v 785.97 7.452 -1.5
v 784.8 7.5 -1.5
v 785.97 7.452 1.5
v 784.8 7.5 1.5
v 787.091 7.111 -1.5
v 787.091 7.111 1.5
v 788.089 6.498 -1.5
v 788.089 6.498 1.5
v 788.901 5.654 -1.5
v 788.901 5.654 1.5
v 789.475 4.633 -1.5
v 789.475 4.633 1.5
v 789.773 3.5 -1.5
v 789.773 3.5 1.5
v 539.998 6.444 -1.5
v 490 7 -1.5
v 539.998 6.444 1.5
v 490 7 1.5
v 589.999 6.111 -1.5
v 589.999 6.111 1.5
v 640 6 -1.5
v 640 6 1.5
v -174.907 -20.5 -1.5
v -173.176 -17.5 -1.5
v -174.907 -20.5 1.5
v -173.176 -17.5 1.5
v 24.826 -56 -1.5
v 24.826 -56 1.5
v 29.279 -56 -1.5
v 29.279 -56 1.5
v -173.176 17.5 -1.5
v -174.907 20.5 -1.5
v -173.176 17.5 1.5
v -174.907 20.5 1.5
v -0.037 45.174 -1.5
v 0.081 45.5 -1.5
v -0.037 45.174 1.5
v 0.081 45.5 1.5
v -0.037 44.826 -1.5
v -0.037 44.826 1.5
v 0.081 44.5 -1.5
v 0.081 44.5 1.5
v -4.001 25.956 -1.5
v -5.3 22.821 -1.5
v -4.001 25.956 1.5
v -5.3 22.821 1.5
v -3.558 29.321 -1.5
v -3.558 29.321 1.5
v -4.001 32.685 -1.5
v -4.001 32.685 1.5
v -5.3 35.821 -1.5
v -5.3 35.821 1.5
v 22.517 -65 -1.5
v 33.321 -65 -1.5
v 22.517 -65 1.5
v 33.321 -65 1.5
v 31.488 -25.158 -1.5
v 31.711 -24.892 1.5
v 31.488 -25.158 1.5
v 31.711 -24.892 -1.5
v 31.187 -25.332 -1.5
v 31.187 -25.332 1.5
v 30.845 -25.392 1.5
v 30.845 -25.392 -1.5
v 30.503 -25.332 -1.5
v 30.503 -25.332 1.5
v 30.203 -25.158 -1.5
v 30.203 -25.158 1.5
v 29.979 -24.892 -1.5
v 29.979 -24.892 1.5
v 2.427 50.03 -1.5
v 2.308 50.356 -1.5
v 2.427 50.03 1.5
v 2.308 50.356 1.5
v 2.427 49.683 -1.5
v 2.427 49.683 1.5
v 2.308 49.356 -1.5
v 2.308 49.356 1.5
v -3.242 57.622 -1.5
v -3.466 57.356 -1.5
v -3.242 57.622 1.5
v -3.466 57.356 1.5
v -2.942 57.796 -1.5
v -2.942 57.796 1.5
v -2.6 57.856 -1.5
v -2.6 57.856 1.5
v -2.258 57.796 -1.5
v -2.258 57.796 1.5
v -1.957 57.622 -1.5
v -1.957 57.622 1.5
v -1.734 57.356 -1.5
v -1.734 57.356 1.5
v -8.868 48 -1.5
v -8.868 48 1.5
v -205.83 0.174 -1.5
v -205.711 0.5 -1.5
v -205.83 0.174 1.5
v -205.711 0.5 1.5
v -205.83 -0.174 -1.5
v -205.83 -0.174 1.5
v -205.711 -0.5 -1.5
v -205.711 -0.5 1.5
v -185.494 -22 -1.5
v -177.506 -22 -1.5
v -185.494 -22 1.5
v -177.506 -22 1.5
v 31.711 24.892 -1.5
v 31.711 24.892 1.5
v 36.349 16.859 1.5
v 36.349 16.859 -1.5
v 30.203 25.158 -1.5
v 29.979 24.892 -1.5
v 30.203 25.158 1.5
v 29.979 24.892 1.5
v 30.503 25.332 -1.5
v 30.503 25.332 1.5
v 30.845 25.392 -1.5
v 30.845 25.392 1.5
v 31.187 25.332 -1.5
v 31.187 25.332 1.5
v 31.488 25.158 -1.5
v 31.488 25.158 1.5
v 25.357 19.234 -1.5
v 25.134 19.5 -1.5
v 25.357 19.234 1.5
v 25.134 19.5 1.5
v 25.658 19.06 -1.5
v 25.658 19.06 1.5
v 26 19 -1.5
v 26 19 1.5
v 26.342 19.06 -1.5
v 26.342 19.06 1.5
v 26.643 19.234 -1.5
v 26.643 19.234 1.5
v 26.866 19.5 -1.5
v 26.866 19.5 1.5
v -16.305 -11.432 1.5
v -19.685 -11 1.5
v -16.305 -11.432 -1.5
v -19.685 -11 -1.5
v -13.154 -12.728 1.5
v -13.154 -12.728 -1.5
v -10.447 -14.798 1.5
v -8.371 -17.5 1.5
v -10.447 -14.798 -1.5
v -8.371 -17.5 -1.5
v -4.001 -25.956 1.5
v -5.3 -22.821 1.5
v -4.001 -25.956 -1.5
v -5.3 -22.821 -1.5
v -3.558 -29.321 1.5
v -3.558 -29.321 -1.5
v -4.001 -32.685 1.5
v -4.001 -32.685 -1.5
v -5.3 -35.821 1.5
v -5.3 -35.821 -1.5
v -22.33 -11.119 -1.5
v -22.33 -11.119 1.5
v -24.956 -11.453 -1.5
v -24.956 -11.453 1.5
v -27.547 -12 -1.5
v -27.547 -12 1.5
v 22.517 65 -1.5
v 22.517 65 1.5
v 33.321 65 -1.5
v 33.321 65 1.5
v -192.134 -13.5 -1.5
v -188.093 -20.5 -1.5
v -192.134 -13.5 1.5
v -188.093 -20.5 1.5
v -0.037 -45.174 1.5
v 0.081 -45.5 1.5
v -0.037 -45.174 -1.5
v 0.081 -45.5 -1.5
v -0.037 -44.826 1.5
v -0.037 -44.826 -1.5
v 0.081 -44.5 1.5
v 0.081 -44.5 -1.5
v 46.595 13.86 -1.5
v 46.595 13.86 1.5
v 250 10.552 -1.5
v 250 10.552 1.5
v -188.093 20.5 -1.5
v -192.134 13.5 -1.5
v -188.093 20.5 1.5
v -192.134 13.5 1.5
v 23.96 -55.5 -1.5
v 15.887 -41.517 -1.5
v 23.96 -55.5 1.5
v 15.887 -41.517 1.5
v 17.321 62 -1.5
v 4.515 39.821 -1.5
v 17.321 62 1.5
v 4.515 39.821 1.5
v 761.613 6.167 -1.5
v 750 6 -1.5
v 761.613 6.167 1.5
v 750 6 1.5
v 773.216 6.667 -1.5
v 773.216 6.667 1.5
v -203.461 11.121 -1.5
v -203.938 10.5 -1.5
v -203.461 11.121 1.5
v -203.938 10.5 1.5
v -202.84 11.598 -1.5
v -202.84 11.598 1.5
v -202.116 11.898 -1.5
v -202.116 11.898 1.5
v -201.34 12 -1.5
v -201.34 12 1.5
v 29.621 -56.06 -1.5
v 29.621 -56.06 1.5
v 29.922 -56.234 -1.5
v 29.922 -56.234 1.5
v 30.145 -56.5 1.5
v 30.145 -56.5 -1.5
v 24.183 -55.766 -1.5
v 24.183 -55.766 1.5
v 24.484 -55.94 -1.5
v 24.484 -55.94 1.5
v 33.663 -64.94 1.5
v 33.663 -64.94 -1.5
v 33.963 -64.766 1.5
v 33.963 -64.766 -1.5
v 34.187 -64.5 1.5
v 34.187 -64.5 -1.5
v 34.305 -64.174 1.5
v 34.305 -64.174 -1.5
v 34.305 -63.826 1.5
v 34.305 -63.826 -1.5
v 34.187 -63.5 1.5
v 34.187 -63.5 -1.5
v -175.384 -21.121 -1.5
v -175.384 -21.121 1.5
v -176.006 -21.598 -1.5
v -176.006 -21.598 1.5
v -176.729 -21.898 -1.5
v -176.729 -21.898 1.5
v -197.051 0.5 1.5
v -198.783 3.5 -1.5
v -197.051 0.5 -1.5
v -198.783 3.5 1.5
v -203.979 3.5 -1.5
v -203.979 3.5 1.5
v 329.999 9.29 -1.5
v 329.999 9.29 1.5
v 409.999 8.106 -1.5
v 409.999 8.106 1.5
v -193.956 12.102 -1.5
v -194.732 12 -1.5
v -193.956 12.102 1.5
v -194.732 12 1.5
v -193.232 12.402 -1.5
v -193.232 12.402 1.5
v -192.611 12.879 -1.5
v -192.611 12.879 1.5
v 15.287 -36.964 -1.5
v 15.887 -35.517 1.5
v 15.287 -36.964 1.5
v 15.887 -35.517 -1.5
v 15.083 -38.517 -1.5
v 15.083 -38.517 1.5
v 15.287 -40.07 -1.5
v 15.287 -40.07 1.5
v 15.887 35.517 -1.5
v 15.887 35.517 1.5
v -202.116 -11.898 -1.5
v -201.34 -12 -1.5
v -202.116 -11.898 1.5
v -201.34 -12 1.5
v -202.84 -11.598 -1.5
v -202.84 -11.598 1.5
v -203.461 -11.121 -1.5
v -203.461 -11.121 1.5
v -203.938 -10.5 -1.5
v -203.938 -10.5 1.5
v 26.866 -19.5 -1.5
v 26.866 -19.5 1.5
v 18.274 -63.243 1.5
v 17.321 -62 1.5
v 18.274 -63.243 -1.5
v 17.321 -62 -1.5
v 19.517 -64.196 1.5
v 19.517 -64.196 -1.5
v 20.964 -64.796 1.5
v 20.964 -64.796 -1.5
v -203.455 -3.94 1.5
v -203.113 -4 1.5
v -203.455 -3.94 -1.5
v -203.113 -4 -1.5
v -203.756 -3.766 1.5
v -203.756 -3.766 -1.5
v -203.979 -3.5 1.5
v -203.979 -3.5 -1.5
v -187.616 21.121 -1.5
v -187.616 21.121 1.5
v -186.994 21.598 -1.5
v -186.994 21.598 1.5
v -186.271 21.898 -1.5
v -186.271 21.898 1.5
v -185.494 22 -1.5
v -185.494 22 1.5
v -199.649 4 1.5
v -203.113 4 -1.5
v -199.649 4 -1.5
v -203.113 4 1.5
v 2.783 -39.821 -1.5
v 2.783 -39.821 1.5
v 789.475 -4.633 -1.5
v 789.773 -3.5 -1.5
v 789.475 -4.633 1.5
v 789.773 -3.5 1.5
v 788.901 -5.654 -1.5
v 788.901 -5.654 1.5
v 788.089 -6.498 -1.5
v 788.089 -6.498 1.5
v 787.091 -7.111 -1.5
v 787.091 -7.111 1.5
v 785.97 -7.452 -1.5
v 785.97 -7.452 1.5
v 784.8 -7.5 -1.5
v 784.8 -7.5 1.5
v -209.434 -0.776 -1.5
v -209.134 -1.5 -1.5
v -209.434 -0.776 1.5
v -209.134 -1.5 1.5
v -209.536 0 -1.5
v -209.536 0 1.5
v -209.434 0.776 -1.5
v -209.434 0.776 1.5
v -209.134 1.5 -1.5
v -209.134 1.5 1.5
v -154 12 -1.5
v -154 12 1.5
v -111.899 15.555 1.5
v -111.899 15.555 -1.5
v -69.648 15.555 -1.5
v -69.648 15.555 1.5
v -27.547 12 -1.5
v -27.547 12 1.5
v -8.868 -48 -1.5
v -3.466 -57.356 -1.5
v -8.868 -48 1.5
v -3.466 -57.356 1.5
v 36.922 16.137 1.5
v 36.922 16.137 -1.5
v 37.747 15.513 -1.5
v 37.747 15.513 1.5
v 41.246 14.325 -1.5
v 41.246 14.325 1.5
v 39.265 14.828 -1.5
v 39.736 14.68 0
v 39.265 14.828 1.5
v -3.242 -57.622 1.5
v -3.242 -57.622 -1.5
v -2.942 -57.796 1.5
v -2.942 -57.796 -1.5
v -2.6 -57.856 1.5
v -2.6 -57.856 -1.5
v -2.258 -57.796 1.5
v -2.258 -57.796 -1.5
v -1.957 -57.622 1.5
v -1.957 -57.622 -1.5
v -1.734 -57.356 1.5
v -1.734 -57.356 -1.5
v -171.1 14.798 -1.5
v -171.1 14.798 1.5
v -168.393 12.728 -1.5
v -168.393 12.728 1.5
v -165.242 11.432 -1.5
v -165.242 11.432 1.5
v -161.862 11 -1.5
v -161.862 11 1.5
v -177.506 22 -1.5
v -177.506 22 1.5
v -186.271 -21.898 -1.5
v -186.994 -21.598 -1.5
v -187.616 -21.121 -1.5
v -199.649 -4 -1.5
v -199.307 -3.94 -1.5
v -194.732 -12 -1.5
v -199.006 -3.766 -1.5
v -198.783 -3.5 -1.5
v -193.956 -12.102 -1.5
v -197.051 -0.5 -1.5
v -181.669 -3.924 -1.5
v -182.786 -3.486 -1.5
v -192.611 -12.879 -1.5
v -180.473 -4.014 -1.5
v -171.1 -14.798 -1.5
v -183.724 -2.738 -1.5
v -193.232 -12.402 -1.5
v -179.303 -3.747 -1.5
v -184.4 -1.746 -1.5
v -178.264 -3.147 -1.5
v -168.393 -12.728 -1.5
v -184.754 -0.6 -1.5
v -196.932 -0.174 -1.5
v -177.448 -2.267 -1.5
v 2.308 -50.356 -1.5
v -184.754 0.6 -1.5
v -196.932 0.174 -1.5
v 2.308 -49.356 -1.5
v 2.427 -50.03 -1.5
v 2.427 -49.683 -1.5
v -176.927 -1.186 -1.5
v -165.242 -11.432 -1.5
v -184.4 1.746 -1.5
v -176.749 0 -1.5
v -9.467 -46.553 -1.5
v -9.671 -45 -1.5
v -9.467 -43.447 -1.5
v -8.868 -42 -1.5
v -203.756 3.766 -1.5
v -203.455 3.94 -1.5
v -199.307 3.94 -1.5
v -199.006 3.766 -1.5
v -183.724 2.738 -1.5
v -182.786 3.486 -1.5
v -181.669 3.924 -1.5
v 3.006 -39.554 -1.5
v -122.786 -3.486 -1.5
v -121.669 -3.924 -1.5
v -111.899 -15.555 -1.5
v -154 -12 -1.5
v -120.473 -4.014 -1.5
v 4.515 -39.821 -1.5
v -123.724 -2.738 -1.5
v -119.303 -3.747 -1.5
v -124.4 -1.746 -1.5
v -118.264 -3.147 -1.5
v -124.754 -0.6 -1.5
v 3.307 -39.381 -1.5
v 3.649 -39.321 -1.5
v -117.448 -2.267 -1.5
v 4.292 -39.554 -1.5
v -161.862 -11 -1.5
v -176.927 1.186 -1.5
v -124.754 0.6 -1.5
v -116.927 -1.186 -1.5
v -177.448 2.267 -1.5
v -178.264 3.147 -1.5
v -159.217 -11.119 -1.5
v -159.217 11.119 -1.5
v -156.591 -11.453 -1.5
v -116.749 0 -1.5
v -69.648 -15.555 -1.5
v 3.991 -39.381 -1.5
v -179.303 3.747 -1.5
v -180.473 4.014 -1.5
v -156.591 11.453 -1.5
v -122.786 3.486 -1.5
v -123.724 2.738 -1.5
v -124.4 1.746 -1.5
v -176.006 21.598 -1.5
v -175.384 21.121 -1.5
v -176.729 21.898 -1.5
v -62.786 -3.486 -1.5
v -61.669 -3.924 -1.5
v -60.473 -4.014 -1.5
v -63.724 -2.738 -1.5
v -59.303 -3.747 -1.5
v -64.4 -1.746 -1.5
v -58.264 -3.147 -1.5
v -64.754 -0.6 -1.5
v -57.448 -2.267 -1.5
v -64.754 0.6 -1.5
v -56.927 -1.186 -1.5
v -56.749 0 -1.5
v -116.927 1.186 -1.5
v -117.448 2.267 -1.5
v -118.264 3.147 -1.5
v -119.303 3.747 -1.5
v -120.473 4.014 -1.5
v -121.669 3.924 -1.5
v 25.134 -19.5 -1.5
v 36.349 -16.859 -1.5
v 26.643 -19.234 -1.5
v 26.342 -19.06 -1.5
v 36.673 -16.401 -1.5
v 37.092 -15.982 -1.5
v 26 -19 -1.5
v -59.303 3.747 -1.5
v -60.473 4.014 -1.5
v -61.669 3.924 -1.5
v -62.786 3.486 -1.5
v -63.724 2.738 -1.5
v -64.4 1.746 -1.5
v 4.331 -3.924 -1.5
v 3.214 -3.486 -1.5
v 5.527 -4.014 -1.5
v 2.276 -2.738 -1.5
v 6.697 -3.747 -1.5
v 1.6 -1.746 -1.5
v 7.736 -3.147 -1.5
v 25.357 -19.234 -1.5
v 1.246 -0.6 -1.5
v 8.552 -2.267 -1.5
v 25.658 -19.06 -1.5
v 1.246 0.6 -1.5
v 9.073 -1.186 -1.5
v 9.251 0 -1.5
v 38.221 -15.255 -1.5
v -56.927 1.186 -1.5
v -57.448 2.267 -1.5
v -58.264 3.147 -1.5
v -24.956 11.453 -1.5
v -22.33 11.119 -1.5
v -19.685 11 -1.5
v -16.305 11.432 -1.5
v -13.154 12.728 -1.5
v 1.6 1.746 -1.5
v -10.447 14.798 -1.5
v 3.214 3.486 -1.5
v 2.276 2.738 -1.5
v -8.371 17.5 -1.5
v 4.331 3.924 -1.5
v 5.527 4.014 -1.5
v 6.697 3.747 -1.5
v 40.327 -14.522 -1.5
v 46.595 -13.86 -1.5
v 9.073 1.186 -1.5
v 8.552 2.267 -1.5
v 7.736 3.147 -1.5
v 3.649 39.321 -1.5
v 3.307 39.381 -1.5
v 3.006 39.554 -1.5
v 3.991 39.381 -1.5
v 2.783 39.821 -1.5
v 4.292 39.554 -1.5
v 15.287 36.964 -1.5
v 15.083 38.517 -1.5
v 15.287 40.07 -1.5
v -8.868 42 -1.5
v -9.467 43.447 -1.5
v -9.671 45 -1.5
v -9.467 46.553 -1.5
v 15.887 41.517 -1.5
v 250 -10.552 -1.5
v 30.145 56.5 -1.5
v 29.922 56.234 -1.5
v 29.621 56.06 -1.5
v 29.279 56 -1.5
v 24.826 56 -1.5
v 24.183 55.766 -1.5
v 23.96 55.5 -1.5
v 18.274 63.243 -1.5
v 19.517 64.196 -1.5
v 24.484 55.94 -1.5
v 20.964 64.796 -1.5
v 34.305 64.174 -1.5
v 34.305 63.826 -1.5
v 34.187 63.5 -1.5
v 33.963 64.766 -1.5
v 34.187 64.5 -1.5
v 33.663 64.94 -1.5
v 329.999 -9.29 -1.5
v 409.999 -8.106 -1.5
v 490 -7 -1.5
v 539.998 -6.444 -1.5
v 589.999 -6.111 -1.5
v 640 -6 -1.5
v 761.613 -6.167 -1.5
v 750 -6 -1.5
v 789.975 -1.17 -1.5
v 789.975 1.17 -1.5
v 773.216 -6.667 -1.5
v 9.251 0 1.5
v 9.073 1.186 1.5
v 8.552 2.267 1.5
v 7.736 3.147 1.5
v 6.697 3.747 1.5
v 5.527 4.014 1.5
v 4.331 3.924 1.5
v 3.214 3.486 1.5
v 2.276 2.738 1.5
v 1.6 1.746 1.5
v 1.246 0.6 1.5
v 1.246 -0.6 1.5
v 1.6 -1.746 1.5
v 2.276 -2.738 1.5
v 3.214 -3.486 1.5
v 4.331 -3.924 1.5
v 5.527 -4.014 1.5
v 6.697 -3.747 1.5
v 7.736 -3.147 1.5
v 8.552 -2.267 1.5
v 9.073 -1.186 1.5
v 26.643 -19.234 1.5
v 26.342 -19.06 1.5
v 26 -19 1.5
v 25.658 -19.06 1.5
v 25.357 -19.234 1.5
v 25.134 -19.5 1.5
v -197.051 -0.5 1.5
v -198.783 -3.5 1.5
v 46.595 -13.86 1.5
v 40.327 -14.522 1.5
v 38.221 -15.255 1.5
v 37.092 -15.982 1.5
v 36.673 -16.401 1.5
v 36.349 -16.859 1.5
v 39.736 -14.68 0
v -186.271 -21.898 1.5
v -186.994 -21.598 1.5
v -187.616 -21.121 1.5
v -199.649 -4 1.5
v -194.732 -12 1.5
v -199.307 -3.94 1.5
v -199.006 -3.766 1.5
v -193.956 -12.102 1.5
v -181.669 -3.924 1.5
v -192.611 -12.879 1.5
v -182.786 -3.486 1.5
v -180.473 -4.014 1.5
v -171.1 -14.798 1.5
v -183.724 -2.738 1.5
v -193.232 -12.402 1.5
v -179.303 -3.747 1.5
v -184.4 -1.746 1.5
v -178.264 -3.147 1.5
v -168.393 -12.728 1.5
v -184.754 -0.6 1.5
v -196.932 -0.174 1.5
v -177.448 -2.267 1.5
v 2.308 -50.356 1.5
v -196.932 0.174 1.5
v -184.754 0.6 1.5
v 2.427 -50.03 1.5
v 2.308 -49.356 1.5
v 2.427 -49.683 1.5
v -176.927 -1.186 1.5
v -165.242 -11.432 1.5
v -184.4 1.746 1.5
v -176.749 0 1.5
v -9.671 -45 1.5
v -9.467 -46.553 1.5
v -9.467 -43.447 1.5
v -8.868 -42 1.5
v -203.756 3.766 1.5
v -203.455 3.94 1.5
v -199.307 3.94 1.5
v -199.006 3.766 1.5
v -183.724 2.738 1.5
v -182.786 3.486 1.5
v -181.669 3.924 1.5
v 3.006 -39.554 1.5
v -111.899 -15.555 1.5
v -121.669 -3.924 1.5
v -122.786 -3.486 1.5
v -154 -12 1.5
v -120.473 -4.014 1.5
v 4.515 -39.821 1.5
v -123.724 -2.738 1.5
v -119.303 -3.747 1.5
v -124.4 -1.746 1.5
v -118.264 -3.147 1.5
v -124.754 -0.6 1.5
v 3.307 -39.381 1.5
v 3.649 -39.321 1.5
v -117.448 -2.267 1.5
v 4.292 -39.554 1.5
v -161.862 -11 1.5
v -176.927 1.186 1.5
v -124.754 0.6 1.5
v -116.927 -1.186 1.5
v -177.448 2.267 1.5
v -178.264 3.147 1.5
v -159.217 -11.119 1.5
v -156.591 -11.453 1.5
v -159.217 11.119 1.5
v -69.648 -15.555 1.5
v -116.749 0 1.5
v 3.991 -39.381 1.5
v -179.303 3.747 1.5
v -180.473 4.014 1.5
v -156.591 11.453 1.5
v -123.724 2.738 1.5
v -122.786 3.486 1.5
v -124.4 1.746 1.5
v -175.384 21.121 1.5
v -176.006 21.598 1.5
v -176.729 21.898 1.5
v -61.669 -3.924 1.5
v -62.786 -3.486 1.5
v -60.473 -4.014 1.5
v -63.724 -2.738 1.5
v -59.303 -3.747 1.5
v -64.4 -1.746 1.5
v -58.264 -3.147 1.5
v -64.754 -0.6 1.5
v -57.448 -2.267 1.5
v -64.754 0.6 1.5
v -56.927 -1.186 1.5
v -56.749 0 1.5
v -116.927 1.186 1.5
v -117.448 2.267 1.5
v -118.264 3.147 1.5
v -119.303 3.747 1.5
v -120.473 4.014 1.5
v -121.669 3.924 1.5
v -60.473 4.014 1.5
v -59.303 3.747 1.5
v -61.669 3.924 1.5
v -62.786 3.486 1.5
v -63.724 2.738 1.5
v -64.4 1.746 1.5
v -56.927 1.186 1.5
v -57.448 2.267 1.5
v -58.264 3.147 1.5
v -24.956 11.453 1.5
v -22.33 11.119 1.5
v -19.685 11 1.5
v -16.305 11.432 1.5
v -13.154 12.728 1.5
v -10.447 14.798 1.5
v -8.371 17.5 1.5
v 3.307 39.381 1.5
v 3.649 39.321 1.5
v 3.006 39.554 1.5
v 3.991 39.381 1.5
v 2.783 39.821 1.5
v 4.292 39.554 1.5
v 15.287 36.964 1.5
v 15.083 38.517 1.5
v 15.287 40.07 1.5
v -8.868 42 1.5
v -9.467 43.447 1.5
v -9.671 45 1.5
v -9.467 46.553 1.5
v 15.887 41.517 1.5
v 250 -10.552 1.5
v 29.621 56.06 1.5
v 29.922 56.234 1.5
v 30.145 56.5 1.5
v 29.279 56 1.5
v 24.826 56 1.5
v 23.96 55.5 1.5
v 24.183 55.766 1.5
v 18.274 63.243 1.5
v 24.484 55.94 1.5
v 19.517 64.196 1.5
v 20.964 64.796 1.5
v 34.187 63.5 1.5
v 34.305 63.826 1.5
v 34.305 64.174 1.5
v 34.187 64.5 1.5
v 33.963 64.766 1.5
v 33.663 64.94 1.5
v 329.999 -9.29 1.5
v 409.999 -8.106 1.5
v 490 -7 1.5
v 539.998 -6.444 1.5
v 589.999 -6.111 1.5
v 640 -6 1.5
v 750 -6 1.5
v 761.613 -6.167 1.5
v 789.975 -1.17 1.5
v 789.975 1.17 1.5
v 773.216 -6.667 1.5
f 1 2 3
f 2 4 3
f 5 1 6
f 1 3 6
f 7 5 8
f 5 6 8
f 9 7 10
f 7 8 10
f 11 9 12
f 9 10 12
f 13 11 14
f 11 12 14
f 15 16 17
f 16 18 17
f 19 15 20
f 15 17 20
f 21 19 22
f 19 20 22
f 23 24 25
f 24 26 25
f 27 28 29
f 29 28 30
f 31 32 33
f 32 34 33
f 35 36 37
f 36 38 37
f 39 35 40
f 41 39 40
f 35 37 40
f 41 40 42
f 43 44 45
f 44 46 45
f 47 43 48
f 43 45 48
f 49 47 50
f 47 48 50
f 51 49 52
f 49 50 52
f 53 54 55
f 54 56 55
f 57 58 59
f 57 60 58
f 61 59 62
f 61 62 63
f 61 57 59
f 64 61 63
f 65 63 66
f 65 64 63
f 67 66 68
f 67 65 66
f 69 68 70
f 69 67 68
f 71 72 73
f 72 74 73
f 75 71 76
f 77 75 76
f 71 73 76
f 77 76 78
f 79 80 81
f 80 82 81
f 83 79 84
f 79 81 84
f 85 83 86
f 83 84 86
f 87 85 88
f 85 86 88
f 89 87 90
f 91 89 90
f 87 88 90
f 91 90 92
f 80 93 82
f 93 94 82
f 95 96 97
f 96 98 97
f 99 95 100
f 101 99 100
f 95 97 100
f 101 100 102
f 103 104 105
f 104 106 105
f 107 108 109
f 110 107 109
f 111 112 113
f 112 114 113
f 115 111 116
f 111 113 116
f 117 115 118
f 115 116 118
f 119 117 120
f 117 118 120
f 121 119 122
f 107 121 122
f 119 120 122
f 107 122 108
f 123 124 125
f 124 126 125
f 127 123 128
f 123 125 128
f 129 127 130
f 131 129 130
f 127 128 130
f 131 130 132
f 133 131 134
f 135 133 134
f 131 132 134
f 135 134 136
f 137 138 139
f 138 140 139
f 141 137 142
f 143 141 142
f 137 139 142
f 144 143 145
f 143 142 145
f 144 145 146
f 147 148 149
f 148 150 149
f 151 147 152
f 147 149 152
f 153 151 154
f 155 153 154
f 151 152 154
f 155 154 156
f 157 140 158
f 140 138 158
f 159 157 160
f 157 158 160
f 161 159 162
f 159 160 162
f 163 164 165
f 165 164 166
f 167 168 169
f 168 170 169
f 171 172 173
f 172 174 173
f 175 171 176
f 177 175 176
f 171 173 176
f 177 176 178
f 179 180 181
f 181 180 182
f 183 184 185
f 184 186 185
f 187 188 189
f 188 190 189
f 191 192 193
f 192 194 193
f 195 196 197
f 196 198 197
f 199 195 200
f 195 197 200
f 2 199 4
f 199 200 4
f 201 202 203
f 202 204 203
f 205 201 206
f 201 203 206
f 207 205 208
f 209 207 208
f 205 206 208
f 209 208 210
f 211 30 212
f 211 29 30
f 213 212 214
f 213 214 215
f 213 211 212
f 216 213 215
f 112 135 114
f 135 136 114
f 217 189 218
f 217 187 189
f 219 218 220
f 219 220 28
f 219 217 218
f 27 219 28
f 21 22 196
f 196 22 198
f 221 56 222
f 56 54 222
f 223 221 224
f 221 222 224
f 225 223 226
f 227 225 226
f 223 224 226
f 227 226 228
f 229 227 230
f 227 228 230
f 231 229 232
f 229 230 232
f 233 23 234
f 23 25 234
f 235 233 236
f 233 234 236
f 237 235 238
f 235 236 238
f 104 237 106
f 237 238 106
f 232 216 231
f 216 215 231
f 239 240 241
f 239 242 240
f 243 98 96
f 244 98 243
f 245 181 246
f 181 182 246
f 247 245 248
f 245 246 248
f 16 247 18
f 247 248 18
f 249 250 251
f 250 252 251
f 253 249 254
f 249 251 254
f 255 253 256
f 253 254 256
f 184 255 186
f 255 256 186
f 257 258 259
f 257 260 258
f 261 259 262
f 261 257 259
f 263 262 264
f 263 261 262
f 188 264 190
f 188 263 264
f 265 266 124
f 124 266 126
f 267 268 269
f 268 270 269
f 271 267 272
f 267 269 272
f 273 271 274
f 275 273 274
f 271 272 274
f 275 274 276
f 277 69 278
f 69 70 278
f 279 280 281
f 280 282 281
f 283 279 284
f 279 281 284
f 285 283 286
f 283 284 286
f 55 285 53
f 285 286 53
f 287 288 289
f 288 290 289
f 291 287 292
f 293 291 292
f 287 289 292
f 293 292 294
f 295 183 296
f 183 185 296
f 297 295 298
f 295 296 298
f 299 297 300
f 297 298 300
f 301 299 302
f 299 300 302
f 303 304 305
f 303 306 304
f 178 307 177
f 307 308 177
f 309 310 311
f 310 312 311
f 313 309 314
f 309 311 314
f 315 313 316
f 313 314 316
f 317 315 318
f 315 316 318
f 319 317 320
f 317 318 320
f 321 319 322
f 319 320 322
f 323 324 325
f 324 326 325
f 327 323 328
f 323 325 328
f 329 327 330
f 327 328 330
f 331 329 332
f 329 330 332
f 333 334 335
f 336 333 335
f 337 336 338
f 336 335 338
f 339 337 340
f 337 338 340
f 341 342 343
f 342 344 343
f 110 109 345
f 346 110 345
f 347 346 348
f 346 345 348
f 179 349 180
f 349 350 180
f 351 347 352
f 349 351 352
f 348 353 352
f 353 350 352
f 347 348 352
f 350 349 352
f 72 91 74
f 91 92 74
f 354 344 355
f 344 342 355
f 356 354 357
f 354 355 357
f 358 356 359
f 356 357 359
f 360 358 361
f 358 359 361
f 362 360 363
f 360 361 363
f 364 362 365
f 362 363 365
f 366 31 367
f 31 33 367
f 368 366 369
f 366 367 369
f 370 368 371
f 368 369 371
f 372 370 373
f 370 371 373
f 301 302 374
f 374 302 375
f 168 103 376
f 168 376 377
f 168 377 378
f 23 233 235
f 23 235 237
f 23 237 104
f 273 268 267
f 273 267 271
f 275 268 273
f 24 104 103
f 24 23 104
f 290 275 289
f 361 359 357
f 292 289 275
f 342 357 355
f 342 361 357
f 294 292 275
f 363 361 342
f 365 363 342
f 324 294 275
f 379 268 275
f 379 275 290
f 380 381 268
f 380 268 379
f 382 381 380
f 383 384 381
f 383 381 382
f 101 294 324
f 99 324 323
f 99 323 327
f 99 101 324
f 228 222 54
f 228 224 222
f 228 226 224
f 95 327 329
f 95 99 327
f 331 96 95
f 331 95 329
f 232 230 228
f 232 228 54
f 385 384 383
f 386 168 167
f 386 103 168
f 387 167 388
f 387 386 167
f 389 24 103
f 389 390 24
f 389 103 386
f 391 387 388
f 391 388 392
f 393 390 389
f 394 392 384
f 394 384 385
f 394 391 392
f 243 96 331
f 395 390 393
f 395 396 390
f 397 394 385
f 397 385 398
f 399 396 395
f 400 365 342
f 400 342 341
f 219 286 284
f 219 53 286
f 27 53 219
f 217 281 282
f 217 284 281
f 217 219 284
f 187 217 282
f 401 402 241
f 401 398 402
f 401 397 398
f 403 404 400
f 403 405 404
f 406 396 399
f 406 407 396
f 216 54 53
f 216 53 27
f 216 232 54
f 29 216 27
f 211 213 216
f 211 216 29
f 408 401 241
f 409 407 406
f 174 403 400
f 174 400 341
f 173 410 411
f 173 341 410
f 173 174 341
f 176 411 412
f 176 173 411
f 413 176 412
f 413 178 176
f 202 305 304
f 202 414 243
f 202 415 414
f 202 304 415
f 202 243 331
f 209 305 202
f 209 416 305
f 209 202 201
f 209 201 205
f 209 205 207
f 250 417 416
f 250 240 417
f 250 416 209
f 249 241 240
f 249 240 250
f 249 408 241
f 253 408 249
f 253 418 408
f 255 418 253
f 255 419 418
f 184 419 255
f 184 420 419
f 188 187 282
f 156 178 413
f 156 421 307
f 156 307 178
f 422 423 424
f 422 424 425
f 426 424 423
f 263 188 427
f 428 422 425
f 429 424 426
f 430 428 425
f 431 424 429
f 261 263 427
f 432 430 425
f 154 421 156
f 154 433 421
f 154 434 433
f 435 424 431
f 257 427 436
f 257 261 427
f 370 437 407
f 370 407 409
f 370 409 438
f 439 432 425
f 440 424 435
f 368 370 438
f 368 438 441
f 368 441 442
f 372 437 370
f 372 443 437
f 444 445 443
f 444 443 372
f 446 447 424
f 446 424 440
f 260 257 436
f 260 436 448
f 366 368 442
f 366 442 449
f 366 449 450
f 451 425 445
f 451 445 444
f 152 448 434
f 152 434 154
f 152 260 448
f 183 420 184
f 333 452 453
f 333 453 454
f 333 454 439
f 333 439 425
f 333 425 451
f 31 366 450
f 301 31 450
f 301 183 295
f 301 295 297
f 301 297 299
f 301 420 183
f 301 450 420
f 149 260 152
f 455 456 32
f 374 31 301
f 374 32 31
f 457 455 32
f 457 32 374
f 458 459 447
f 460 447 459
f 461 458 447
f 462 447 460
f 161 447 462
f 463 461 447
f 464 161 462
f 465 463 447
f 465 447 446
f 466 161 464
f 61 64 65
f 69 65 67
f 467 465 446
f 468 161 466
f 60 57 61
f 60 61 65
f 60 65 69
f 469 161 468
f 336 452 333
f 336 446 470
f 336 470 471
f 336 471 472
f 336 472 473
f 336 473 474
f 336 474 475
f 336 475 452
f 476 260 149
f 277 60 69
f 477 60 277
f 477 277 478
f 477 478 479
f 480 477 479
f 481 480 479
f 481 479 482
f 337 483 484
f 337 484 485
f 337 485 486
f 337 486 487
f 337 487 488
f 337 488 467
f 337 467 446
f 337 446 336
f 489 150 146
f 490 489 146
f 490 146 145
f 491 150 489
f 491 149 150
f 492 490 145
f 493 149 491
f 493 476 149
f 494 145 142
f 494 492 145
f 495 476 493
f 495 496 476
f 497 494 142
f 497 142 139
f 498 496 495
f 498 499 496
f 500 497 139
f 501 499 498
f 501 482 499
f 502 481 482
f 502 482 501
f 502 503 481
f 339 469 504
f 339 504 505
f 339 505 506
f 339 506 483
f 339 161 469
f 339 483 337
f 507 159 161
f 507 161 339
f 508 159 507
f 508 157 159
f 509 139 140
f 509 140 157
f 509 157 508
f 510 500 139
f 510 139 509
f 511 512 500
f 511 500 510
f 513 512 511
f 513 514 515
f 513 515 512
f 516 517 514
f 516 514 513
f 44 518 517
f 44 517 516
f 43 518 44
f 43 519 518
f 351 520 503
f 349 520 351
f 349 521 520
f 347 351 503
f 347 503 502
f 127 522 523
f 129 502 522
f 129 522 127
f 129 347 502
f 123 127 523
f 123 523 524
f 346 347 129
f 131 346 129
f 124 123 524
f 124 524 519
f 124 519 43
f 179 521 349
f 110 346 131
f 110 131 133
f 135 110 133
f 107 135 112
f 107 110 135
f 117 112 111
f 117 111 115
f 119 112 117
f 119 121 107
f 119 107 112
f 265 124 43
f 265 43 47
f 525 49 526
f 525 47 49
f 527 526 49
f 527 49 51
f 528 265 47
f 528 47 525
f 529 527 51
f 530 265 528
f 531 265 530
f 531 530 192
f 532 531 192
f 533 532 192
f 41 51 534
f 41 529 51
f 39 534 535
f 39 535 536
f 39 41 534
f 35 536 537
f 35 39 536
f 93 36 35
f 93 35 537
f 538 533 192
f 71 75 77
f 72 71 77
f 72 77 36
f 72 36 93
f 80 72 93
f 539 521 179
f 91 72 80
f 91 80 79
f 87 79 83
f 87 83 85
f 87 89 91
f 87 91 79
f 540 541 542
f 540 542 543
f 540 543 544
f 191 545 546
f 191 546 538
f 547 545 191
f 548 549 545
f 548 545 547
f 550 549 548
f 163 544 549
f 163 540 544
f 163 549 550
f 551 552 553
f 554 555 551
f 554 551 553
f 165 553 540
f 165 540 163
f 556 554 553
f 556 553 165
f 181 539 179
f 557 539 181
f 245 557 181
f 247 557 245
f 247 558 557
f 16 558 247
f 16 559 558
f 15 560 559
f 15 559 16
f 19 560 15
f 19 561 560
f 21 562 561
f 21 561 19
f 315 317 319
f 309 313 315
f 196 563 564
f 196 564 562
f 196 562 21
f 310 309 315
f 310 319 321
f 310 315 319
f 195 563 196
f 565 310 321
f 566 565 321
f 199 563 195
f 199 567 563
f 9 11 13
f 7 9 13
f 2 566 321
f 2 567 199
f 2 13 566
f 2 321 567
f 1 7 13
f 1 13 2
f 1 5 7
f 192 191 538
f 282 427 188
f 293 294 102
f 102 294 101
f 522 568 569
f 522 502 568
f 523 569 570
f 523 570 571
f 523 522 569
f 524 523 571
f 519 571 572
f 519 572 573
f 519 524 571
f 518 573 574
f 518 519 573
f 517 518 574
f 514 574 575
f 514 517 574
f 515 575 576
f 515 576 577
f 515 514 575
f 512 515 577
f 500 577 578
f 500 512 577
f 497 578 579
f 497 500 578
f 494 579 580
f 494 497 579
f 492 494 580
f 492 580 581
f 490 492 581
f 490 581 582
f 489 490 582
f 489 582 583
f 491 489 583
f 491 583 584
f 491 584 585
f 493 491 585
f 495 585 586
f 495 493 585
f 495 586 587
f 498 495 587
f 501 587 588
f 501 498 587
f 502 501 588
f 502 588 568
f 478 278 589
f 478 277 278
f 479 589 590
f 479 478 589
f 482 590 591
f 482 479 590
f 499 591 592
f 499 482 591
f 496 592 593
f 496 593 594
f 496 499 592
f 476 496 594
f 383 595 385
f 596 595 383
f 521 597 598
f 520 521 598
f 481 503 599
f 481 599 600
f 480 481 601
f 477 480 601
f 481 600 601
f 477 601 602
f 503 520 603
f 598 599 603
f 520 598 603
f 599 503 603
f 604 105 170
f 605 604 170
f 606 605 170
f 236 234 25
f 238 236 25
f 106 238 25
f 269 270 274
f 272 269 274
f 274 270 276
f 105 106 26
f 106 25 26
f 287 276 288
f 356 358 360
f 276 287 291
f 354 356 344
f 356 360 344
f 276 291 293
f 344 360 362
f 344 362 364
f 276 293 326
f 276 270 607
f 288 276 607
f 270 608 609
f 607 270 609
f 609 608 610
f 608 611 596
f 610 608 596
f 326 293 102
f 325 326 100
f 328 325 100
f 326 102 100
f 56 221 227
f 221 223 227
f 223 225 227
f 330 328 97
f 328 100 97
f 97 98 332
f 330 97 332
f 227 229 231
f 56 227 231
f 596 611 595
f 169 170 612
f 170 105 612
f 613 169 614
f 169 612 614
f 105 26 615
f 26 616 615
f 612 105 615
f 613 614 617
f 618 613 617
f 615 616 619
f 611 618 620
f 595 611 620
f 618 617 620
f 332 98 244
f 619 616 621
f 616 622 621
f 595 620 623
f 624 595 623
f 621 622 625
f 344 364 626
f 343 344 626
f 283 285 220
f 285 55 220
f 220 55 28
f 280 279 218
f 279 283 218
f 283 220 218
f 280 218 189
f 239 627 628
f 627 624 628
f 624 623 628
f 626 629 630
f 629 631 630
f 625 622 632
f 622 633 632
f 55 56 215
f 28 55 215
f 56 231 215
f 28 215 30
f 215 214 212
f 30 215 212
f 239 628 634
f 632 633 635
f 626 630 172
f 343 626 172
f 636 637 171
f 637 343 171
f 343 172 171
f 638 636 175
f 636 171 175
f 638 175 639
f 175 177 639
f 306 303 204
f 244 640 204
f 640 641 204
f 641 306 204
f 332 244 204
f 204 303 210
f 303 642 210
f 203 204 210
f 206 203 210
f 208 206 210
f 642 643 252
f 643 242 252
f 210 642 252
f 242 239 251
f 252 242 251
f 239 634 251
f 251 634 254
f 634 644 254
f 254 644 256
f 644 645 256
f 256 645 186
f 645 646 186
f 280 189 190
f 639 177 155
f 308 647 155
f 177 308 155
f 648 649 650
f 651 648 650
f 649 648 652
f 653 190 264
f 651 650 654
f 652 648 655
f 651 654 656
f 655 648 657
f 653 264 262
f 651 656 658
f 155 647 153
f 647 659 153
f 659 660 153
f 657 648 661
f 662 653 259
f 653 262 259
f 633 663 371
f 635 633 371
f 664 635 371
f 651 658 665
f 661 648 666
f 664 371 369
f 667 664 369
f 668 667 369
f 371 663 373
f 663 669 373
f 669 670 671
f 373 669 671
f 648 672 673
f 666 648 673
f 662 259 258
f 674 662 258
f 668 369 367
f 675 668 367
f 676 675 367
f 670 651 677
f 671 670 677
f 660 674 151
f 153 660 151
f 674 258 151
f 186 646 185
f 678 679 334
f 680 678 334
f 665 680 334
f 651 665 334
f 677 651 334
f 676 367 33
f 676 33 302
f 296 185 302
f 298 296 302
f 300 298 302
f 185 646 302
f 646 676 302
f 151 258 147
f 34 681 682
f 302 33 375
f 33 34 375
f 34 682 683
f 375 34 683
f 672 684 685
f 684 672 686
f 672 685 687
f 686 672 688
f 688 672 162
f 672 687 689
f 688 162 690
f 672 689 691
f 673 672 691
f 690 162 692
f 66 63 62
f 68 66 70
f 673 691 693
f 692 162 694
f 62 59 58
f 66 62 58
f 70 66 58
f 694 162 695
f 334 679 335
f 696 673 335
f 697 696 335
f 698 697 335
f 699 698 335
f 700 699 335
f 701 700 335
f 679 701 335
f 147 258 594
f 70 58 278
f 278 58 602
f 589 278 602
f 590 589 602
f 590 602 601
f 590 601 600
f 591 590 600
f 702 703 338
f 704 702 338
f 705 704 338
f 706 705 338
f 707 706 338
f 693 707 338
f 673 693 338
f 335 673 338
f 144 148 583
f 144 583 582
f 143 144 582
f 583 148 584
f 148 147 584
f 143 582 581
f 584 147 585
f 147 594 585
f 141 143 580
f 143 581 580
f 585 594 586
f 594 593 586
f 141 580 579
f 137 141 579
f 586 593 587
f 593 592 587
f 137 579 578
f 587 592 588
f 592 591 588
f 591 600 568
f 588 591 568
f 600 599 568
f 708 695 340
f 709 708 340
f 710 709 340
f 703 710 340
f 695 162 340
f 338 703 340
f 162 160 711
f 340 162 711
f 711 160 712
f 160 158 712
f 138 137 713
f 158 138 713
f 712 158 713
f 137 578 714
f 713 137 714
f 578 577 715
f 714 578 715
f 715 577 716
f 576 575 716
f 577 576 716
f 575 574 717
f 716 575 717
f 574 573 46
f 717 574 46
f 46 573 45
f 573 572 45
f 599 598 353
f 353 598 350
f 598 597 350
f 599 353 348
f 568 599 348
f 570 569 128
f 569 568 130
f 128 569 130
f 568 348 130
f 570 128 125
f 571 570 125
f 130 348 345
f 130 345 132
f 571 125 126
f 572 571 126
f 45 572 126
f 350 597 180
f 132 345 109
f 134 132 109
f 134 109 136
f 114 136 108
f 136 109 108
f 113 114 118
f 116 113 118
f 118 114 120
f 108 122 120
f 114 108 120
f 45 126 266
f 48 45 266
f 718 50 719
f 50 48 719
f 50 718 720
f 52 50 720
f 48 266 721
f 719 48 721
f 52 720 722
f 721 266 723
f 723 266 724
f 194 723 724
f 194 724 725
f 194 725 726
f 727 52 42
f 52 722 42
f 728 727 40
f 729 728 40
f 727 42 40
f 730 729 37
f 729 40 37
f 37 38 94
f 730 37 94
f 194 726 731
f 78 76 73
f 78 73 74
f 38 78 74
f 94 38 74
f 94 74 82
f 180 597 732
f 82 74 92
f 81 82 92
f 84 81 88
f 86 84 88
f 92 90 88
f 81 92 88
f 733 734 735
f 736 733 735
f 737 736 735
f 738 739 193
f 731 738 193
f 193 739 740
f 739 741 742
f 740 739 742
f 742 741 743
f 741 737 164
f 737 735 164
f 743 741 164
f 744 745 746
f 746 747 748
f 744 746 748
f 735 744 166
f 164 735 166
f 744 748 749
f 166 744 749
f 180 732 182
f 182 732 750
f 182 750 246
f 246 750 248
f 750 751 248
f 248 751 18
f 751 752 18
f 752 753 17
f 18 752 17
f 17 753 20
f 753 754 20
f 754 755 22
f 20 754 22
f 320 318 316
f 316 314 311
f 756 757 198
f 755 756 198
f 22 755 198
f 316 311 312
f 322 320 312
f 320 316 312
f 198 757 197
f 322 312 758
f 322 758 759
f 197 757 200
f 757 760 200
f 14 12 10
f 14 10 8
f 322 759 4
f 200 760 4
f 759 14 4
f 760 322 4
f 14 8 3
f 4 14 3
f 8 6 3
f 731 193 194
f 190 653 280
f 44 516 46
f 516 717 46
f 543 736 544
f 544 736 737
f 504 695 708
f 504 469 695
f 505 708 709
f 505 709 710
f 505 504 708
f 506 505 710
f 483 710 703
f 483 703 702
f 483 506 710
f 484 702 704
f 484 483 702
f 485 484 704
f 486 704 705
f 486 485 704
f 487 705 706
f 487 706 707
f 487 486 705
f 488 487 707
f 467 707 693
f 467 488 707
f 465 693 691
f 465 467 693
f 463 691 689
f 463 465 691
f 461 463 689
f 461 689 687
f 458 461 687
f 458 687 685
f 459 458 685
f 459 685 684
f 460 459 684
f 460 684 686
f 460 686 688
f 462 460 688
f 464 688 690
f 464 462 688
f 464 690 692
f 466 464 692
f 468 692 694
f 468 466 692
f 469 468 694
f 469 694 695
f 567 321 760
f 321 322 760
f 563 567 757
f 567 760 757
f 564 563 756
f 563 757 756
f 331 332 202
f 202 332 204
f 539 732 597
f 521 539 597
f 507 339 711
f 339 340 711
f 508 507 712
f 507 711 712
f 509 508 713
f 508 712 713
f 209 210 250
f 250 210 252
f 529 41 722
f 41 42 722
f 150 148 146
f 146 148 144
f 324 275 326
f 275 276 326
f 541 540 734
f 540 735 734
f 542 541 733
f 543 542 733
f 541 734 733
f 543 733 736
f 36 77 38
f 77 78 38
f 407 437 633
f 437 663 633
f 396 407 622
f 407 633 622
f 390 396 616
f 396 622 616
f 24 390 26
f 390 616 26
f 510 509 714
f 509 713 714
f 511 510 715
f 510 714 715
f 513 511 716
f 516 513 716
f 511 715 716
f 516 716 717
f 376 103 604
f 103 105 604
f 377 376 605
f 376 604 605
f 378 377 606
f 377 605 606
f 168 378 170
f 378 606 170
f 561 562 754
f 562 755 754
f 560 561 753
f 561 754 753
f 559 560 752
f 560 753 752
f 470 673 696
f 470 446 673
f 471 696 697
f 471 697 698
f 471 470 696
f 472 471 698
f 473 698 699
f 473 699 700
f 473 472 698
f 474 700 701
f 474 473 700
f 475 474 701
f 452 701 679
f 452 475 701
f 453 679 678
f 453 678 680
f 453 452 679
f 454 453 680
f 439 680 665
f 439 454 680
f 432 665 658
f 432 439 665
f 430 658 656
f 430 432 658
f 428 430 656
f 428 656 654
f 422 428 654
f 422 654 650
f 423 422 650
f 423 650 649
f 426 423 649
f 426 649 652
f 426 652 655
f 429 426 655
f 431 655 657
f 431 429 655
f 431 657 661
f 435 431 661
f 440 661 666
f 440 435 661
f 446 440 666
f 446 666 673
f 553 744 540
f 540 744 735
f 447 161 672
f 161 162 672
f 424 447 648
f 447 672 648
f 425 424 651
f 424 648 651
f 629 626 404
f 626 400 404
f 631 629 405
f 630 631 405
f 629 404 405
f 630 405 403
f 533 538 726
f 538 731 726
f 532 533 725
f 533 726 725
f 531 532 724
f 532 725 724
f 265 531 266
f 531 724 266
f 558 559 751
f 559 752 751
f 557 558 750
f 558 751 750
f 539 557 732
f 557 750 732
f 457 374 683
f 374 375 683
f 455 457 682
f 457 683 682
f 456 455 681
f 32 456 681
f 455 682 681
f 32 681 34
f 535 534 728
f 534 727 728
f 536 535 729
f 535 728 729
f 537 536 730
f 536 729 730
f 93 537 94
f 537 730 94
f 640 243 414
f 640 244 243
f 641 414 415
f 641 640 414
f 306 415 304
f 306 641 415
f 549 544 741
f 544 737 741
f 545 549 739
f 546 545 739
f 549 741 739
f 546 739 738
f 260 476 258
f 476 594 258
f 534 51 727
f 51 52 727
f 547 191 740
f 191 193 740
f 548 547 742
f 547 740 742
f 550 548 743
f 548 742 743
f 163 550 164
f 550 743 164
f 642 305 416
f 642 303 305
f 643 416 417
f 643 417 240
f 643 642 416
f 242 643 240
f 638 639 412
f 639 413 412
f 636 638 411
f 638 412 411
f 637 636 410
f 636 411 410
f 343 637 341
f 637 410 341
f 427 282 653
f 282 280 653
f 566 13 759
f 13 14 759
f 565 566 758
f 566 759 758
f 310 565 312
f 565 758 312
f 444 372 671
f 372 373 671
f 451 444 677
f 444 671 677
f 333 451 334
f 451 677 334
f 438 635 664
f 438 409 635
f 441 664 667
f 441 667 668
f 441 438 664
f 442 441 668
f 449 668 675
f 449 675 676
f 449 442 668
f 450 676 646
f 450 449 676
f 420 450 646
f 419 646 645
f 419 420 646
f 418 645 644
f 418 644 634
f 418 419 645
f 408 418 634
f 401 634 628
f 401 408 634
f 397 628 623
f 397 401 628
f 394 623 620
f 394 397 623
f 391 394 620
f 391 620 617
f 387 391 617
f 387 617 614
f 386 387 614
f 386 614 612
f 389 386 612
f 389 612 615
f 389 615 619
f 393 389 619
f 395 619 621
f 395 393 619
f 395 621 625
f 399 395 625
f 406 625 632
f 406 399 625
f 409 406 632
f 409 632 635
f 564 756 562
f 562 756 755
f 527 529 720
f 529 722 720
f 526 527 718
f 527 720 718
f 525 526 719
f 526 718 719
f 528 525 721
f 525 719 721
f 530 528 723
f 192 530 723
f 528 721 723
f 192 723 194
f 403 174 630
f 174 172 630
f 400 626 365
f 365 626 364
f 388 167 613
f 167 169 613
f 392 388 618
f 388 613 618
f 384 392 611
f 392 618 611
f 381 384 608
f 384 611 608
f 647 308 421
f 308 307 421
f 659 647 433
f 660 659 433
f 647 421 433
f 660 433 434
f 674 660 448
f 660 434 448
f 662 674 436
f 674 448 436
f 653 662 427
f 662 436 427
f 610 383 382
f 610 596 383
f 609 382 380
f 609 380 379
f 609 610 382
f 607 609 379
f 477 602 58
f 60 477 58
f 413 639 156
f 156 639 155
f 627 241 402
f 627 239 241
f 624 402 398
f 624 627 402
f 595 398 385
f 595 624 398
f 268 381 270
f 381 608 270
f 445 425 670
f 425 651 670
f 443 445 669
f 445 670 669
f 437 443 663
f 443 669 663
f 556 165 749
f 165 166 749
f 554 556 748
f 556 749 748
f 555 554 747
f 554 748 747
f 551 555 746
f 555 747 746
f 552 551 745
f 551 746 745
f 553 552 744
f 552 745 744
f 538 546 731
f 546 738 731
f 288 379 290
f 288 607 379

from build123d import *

# Parameters (mm, degrees)
SKETCH_1_R      = 4.025
EXTRUDE_1_DEPTH = 1.5
FILLET_1_R      = 13
FILLET_2_R      = 6
FILLET_3_R      = 1
FILLET_7_R      = 3


with BuildPart() as part:
    # 草图1 → 凸台-拉伸1 (new, symmetric)
    with BuildSketch(Plane.XY):
        with BuildLine():
            Line((38, 14.000000007), (250, 10.55184781))
            ThreePointArc((250, 10.55184781), (369.998701007, 8.688014918), (490.000004009, 7))
            ThreePointArc((490.000004009, 7), (564.99833736, 6.250002778), (640.000004009, 6))
            Line((640.000004009, 6), (750.000004009, 6))
            ThreePointArc((750.000004009, 6), (767.416160301, 6.375174017), (784.800004009, 7.5))
            ThreePointArc((784.800004009, 7.5), (788.089261415, 6.498216371), (789.772556789, 3.5))
            ThreePointArc((789.772556789, 3.5), (790.000004009, 0), (789.772556789, -3.5))
            ThreePointArc((789.772556789, -3.5), (788.089261415, -6.498216371), (784.800004009, -7.5))
            ThreePointArc((784.800004009, -7.5), (767.416160301, -6.375174017), (750.000004009, -6))
            Line((750.000004009, -6), (640.000004009, -6))
            ThreePointArc((640.000004009, -6), (564.99833736, -6.250002778), (490.000004009, -7))
            ThreePointArc((490.000004009, -7), (369.998701007, -8.688014918), (250, -10.55184781))
            Line((250, -10.55184781), (38, -14.000000007))
            Line((38, -14.000000007), (30.845299463, -26.392304848))
            Line((30.845299463, -26.392304848), (26, -18))
            Line((26, -18), (14.154700538, -38.516660498))
            Line((14.154700538, -38.516660498), (24.248711306, -56))
            Line((24.248711306, -56), (29.856406461, -56))
            Line((29.856406461, -56), (35.052558882, -65))
            Line((35.052558882, -65), (19.052558883, -65))
            Line((19.052558883, -65), (3.649147039, -38.320508076))
            Line((3.649147039, -38.320508076), (-0.207259422, -45))
            Line((-0.207259422, -45), (2.596588156, -49.856406461))
            Line((2.596588156, -49.856406461), (-2.599564267, -58.856406461))
            Line((-2.599564267, -58.856406461), (-10.599564267, -45))
            Line((-10.599564267, -45), (-1.547005384, -29.320508076))
            Line((-1.547005384, -29.320508076), (-11.547005384, -12))
            ThreePointArc((-11.547005384, -12), (-19.547005384, -11), (-27.547005384, -12))
            ThreePointArc((-27.547005384, -12), (-90.773502692, -16), (-154, -12))
            ThreePointArc((-154, -12), (-162, -11), (-170, -12))
            Line((-170, -12), (-175.773502692, -22))
            Line((-175.773502692, -22), (-187.226497308, -22))
            Line((-187.226497308, -22), (-193, -12))
            Line((-193, -12), (-203.07179677, -12))
            Line((-203.07179677, -12), (-210, 0))
            Line((-210, 0), (-203.071796768, 12))
            Line((-203.071796768, 12), (-193, 12))
            Line((-193, 12), (-187.226497308, 22))
            Line((-187.226497308, 22), (-175.773502689, 22))
            Line((-175.773502689, 22), (-170, 12))
            ThreePointArc((-170, 12), (-162, 11), (-154, 12))
            ThreePointArc((-154, 12), (-90.773502692, 16), (-27.547005384, 12))
            ThreePointArc((-27.547005384, 12), (-19.547005384, 11), (-11.547005384, 12))
            Line((-11.547005384, 12), (-1.547005384, 29.320508076))
            Line((-1.547005384, 29.320508076), (-10.599564267, 45))
            Line((-10.599564267, 45), (-2.599564267, 58.856406461))
            Line((-2.599564267, 58.856406461), (2.596588156, 49.856406461))
            Line((2.596588156, 49.856406461), (-0.207259422, 45))
            Line((-0.207259422, 45), (3.649147039, 38.320508076))
            Line((3.649147039, 38.320508076), (19.052558883, 65))
            Line((19.052558883, 65), (35.052558883, 65))
            Line((35.052558883, 65), (29.856406461, 56))
            Line((29.856406461, 56), (24.248711306, 56))
            Line((24.248711306, 56), (14.154700538, 38.516660498))
            Line((14.154700538, 38.516660498), (26, 18))
            Line((26, 18), (30.845299464, 26.392304849))
            Line((30.845299464, 26.392304849), (38, 14.000000007))
        make_face()
        with Locations((-120.773502692, 0)):
            Circle(SKETCH_1_R, mode=Mode.SUBTRACT)
        with Locations((-60.773502692, 0)):
            Circle(SKETCH_1_R, mode=Mode.SUBTRACT)
        with Locations((-180.773502692, 0)):
            Circle(SKETCH_1_R, mode=Mode.SUBTRACT)
        with Locations((5.226497308, 0)):
            Circle(SKETCH_1_R, mode=Mode.SUBTRACT)
        Polygon((-206, 0), (-203.690598923, 4), (-199.07179677, 4), (-196.762395693, 0), (-199.07179677, -4), (-203.690598923, -4), align=None, mode=Mode.SUBTRACT)
    extrude(amount=EXTRUDE_1_DEPTH, both=True)

    # 圆角1
    fillet_1_edges = [part.edges().sort_by_distance(p)[0] for p in [
        (-1.547005384, -29.320508076, 0),
        (-11.547005384, -12, 0),
        (-170, -12, 0),
        (-170, 12, 0),
        (-11.547005384, 12, 0),
        (-1.547005384, 29.320508076, 0),
    ]]
    fillet(fillet_1_edges, radius=FILLET_1_R)

    # 圆角2
    fillet_2_edges = [part.edges().sort_by_distance(p)[0] for p in [
        (14.154700538, -38.516660498, 0),
        (19.052558883, -65, 0),
        (-10.599564267, -45, 0),
        (-10.599564267, 45, 0),
        (19.052558883, 65, 0),
        (14.154700538, 38.516660498, 0),
    ]]
    fillet(fillet_2_edges, radius=FILLET_2_R)

    # 圆角3
    fillet_3_edges = [part.edges().sort_by_distance(p)[0] for p in [
        (-196.762395693, 0, 0),
        (-199.07179677, 4, 0),
        (-203.690598923, 4, 0),
        (-206, 0, 0),
        (-203.690598923, -4, 0),
        (-199.07179677, -4, 0),
        (24.248711306, -56, 0),
        (29.856406461, -56, 0),
        (35.052558882, -65, 0),
        (3.649147039, -38.320508076, 0),
        (-0.207259422, -45, 0),
        (2.596588156, -49.856406461, 0),
        (-2.599564267, -58.856406461, 0),
        (-2.599564267, 58.856406461, 0),
        (2.596588156, 49.856406461, 0),
        (-0.207259422, 45, 0),
        (3.649147039, 38.320508076, 0),
        (35.052558883, 65, 0),
        (29.856406461, 56, 0),
        (24.248711306, 56, 0),
        (26, 18, 0),
        (30.845299464, 26.392304849, 0),
        (30.845299463, -26.392304848, 0),
        (26, -18, 0),
    ]]
    fillet(fillet_3_edges, radius=FILLET_3_R)

    # 圆角5
    # a fillet whose section is not a circle: 12, 9 mm, written as the material it adds along each edge
    with BuildSketch(Plane(origin=(38, -14.000000007, 1.5), x_dir=(0.9998677532589965, 0.016262717878828103, 0), z_dir=(0, 0, -1))) as fillet_5_piece_1:
        with BuildLine():
            Bezier((8.596427908, 0), (0, 0), (-1.696926281, 2.831786358), weights=[1, 1, 1])
            Line((-1.696926281, 2.831786358), (0, 0))
            Line((0, 0), (8.596427908, 0))
        make_face()
    extrude(amount=3)

    # 圆角6
    # a fillet whose section is not a circle: 12, 9 mm, written as the material it adds along each edge
    with BuildSketch(Plane(origin=(38, 14.000000007, 1.5), x_dir=(-0.5000000000000278, 0.8660254037844227, 0), z_dir=(0, 0, -1))) as fillet_6_piece_1:
        with BuildLine():
            Bezier((3.301298651, 0), (0, 0), (-4.418716991, 7.373839769), weights=[1, 1, 1])
            Line((-4.418716991, 7.373839769), (0, 0))
            Line((0, 0), (3.301298651, 0))
        make_face()
    extrude(amount=3)

    # 圆角7
    fillet_7_edges = [part.edges().sort_by_distance(p)[0] for p in [
        (-175.773502692, -22, 0),
        (-187.226497308, -22, 0),
        (-193, -12, 0),
        (-203.07179677, -12, 0),
        (-210, 0, 0),
        (-203.071796768, 12, 0),
        (-193, 12, 0),
        (-187.226497308, 22, 0),
        (-175.773502689, 22, 0),
    ]]
    fillet(fillet_7_edges, radius=FILLET_7_R)


solid = part.part
